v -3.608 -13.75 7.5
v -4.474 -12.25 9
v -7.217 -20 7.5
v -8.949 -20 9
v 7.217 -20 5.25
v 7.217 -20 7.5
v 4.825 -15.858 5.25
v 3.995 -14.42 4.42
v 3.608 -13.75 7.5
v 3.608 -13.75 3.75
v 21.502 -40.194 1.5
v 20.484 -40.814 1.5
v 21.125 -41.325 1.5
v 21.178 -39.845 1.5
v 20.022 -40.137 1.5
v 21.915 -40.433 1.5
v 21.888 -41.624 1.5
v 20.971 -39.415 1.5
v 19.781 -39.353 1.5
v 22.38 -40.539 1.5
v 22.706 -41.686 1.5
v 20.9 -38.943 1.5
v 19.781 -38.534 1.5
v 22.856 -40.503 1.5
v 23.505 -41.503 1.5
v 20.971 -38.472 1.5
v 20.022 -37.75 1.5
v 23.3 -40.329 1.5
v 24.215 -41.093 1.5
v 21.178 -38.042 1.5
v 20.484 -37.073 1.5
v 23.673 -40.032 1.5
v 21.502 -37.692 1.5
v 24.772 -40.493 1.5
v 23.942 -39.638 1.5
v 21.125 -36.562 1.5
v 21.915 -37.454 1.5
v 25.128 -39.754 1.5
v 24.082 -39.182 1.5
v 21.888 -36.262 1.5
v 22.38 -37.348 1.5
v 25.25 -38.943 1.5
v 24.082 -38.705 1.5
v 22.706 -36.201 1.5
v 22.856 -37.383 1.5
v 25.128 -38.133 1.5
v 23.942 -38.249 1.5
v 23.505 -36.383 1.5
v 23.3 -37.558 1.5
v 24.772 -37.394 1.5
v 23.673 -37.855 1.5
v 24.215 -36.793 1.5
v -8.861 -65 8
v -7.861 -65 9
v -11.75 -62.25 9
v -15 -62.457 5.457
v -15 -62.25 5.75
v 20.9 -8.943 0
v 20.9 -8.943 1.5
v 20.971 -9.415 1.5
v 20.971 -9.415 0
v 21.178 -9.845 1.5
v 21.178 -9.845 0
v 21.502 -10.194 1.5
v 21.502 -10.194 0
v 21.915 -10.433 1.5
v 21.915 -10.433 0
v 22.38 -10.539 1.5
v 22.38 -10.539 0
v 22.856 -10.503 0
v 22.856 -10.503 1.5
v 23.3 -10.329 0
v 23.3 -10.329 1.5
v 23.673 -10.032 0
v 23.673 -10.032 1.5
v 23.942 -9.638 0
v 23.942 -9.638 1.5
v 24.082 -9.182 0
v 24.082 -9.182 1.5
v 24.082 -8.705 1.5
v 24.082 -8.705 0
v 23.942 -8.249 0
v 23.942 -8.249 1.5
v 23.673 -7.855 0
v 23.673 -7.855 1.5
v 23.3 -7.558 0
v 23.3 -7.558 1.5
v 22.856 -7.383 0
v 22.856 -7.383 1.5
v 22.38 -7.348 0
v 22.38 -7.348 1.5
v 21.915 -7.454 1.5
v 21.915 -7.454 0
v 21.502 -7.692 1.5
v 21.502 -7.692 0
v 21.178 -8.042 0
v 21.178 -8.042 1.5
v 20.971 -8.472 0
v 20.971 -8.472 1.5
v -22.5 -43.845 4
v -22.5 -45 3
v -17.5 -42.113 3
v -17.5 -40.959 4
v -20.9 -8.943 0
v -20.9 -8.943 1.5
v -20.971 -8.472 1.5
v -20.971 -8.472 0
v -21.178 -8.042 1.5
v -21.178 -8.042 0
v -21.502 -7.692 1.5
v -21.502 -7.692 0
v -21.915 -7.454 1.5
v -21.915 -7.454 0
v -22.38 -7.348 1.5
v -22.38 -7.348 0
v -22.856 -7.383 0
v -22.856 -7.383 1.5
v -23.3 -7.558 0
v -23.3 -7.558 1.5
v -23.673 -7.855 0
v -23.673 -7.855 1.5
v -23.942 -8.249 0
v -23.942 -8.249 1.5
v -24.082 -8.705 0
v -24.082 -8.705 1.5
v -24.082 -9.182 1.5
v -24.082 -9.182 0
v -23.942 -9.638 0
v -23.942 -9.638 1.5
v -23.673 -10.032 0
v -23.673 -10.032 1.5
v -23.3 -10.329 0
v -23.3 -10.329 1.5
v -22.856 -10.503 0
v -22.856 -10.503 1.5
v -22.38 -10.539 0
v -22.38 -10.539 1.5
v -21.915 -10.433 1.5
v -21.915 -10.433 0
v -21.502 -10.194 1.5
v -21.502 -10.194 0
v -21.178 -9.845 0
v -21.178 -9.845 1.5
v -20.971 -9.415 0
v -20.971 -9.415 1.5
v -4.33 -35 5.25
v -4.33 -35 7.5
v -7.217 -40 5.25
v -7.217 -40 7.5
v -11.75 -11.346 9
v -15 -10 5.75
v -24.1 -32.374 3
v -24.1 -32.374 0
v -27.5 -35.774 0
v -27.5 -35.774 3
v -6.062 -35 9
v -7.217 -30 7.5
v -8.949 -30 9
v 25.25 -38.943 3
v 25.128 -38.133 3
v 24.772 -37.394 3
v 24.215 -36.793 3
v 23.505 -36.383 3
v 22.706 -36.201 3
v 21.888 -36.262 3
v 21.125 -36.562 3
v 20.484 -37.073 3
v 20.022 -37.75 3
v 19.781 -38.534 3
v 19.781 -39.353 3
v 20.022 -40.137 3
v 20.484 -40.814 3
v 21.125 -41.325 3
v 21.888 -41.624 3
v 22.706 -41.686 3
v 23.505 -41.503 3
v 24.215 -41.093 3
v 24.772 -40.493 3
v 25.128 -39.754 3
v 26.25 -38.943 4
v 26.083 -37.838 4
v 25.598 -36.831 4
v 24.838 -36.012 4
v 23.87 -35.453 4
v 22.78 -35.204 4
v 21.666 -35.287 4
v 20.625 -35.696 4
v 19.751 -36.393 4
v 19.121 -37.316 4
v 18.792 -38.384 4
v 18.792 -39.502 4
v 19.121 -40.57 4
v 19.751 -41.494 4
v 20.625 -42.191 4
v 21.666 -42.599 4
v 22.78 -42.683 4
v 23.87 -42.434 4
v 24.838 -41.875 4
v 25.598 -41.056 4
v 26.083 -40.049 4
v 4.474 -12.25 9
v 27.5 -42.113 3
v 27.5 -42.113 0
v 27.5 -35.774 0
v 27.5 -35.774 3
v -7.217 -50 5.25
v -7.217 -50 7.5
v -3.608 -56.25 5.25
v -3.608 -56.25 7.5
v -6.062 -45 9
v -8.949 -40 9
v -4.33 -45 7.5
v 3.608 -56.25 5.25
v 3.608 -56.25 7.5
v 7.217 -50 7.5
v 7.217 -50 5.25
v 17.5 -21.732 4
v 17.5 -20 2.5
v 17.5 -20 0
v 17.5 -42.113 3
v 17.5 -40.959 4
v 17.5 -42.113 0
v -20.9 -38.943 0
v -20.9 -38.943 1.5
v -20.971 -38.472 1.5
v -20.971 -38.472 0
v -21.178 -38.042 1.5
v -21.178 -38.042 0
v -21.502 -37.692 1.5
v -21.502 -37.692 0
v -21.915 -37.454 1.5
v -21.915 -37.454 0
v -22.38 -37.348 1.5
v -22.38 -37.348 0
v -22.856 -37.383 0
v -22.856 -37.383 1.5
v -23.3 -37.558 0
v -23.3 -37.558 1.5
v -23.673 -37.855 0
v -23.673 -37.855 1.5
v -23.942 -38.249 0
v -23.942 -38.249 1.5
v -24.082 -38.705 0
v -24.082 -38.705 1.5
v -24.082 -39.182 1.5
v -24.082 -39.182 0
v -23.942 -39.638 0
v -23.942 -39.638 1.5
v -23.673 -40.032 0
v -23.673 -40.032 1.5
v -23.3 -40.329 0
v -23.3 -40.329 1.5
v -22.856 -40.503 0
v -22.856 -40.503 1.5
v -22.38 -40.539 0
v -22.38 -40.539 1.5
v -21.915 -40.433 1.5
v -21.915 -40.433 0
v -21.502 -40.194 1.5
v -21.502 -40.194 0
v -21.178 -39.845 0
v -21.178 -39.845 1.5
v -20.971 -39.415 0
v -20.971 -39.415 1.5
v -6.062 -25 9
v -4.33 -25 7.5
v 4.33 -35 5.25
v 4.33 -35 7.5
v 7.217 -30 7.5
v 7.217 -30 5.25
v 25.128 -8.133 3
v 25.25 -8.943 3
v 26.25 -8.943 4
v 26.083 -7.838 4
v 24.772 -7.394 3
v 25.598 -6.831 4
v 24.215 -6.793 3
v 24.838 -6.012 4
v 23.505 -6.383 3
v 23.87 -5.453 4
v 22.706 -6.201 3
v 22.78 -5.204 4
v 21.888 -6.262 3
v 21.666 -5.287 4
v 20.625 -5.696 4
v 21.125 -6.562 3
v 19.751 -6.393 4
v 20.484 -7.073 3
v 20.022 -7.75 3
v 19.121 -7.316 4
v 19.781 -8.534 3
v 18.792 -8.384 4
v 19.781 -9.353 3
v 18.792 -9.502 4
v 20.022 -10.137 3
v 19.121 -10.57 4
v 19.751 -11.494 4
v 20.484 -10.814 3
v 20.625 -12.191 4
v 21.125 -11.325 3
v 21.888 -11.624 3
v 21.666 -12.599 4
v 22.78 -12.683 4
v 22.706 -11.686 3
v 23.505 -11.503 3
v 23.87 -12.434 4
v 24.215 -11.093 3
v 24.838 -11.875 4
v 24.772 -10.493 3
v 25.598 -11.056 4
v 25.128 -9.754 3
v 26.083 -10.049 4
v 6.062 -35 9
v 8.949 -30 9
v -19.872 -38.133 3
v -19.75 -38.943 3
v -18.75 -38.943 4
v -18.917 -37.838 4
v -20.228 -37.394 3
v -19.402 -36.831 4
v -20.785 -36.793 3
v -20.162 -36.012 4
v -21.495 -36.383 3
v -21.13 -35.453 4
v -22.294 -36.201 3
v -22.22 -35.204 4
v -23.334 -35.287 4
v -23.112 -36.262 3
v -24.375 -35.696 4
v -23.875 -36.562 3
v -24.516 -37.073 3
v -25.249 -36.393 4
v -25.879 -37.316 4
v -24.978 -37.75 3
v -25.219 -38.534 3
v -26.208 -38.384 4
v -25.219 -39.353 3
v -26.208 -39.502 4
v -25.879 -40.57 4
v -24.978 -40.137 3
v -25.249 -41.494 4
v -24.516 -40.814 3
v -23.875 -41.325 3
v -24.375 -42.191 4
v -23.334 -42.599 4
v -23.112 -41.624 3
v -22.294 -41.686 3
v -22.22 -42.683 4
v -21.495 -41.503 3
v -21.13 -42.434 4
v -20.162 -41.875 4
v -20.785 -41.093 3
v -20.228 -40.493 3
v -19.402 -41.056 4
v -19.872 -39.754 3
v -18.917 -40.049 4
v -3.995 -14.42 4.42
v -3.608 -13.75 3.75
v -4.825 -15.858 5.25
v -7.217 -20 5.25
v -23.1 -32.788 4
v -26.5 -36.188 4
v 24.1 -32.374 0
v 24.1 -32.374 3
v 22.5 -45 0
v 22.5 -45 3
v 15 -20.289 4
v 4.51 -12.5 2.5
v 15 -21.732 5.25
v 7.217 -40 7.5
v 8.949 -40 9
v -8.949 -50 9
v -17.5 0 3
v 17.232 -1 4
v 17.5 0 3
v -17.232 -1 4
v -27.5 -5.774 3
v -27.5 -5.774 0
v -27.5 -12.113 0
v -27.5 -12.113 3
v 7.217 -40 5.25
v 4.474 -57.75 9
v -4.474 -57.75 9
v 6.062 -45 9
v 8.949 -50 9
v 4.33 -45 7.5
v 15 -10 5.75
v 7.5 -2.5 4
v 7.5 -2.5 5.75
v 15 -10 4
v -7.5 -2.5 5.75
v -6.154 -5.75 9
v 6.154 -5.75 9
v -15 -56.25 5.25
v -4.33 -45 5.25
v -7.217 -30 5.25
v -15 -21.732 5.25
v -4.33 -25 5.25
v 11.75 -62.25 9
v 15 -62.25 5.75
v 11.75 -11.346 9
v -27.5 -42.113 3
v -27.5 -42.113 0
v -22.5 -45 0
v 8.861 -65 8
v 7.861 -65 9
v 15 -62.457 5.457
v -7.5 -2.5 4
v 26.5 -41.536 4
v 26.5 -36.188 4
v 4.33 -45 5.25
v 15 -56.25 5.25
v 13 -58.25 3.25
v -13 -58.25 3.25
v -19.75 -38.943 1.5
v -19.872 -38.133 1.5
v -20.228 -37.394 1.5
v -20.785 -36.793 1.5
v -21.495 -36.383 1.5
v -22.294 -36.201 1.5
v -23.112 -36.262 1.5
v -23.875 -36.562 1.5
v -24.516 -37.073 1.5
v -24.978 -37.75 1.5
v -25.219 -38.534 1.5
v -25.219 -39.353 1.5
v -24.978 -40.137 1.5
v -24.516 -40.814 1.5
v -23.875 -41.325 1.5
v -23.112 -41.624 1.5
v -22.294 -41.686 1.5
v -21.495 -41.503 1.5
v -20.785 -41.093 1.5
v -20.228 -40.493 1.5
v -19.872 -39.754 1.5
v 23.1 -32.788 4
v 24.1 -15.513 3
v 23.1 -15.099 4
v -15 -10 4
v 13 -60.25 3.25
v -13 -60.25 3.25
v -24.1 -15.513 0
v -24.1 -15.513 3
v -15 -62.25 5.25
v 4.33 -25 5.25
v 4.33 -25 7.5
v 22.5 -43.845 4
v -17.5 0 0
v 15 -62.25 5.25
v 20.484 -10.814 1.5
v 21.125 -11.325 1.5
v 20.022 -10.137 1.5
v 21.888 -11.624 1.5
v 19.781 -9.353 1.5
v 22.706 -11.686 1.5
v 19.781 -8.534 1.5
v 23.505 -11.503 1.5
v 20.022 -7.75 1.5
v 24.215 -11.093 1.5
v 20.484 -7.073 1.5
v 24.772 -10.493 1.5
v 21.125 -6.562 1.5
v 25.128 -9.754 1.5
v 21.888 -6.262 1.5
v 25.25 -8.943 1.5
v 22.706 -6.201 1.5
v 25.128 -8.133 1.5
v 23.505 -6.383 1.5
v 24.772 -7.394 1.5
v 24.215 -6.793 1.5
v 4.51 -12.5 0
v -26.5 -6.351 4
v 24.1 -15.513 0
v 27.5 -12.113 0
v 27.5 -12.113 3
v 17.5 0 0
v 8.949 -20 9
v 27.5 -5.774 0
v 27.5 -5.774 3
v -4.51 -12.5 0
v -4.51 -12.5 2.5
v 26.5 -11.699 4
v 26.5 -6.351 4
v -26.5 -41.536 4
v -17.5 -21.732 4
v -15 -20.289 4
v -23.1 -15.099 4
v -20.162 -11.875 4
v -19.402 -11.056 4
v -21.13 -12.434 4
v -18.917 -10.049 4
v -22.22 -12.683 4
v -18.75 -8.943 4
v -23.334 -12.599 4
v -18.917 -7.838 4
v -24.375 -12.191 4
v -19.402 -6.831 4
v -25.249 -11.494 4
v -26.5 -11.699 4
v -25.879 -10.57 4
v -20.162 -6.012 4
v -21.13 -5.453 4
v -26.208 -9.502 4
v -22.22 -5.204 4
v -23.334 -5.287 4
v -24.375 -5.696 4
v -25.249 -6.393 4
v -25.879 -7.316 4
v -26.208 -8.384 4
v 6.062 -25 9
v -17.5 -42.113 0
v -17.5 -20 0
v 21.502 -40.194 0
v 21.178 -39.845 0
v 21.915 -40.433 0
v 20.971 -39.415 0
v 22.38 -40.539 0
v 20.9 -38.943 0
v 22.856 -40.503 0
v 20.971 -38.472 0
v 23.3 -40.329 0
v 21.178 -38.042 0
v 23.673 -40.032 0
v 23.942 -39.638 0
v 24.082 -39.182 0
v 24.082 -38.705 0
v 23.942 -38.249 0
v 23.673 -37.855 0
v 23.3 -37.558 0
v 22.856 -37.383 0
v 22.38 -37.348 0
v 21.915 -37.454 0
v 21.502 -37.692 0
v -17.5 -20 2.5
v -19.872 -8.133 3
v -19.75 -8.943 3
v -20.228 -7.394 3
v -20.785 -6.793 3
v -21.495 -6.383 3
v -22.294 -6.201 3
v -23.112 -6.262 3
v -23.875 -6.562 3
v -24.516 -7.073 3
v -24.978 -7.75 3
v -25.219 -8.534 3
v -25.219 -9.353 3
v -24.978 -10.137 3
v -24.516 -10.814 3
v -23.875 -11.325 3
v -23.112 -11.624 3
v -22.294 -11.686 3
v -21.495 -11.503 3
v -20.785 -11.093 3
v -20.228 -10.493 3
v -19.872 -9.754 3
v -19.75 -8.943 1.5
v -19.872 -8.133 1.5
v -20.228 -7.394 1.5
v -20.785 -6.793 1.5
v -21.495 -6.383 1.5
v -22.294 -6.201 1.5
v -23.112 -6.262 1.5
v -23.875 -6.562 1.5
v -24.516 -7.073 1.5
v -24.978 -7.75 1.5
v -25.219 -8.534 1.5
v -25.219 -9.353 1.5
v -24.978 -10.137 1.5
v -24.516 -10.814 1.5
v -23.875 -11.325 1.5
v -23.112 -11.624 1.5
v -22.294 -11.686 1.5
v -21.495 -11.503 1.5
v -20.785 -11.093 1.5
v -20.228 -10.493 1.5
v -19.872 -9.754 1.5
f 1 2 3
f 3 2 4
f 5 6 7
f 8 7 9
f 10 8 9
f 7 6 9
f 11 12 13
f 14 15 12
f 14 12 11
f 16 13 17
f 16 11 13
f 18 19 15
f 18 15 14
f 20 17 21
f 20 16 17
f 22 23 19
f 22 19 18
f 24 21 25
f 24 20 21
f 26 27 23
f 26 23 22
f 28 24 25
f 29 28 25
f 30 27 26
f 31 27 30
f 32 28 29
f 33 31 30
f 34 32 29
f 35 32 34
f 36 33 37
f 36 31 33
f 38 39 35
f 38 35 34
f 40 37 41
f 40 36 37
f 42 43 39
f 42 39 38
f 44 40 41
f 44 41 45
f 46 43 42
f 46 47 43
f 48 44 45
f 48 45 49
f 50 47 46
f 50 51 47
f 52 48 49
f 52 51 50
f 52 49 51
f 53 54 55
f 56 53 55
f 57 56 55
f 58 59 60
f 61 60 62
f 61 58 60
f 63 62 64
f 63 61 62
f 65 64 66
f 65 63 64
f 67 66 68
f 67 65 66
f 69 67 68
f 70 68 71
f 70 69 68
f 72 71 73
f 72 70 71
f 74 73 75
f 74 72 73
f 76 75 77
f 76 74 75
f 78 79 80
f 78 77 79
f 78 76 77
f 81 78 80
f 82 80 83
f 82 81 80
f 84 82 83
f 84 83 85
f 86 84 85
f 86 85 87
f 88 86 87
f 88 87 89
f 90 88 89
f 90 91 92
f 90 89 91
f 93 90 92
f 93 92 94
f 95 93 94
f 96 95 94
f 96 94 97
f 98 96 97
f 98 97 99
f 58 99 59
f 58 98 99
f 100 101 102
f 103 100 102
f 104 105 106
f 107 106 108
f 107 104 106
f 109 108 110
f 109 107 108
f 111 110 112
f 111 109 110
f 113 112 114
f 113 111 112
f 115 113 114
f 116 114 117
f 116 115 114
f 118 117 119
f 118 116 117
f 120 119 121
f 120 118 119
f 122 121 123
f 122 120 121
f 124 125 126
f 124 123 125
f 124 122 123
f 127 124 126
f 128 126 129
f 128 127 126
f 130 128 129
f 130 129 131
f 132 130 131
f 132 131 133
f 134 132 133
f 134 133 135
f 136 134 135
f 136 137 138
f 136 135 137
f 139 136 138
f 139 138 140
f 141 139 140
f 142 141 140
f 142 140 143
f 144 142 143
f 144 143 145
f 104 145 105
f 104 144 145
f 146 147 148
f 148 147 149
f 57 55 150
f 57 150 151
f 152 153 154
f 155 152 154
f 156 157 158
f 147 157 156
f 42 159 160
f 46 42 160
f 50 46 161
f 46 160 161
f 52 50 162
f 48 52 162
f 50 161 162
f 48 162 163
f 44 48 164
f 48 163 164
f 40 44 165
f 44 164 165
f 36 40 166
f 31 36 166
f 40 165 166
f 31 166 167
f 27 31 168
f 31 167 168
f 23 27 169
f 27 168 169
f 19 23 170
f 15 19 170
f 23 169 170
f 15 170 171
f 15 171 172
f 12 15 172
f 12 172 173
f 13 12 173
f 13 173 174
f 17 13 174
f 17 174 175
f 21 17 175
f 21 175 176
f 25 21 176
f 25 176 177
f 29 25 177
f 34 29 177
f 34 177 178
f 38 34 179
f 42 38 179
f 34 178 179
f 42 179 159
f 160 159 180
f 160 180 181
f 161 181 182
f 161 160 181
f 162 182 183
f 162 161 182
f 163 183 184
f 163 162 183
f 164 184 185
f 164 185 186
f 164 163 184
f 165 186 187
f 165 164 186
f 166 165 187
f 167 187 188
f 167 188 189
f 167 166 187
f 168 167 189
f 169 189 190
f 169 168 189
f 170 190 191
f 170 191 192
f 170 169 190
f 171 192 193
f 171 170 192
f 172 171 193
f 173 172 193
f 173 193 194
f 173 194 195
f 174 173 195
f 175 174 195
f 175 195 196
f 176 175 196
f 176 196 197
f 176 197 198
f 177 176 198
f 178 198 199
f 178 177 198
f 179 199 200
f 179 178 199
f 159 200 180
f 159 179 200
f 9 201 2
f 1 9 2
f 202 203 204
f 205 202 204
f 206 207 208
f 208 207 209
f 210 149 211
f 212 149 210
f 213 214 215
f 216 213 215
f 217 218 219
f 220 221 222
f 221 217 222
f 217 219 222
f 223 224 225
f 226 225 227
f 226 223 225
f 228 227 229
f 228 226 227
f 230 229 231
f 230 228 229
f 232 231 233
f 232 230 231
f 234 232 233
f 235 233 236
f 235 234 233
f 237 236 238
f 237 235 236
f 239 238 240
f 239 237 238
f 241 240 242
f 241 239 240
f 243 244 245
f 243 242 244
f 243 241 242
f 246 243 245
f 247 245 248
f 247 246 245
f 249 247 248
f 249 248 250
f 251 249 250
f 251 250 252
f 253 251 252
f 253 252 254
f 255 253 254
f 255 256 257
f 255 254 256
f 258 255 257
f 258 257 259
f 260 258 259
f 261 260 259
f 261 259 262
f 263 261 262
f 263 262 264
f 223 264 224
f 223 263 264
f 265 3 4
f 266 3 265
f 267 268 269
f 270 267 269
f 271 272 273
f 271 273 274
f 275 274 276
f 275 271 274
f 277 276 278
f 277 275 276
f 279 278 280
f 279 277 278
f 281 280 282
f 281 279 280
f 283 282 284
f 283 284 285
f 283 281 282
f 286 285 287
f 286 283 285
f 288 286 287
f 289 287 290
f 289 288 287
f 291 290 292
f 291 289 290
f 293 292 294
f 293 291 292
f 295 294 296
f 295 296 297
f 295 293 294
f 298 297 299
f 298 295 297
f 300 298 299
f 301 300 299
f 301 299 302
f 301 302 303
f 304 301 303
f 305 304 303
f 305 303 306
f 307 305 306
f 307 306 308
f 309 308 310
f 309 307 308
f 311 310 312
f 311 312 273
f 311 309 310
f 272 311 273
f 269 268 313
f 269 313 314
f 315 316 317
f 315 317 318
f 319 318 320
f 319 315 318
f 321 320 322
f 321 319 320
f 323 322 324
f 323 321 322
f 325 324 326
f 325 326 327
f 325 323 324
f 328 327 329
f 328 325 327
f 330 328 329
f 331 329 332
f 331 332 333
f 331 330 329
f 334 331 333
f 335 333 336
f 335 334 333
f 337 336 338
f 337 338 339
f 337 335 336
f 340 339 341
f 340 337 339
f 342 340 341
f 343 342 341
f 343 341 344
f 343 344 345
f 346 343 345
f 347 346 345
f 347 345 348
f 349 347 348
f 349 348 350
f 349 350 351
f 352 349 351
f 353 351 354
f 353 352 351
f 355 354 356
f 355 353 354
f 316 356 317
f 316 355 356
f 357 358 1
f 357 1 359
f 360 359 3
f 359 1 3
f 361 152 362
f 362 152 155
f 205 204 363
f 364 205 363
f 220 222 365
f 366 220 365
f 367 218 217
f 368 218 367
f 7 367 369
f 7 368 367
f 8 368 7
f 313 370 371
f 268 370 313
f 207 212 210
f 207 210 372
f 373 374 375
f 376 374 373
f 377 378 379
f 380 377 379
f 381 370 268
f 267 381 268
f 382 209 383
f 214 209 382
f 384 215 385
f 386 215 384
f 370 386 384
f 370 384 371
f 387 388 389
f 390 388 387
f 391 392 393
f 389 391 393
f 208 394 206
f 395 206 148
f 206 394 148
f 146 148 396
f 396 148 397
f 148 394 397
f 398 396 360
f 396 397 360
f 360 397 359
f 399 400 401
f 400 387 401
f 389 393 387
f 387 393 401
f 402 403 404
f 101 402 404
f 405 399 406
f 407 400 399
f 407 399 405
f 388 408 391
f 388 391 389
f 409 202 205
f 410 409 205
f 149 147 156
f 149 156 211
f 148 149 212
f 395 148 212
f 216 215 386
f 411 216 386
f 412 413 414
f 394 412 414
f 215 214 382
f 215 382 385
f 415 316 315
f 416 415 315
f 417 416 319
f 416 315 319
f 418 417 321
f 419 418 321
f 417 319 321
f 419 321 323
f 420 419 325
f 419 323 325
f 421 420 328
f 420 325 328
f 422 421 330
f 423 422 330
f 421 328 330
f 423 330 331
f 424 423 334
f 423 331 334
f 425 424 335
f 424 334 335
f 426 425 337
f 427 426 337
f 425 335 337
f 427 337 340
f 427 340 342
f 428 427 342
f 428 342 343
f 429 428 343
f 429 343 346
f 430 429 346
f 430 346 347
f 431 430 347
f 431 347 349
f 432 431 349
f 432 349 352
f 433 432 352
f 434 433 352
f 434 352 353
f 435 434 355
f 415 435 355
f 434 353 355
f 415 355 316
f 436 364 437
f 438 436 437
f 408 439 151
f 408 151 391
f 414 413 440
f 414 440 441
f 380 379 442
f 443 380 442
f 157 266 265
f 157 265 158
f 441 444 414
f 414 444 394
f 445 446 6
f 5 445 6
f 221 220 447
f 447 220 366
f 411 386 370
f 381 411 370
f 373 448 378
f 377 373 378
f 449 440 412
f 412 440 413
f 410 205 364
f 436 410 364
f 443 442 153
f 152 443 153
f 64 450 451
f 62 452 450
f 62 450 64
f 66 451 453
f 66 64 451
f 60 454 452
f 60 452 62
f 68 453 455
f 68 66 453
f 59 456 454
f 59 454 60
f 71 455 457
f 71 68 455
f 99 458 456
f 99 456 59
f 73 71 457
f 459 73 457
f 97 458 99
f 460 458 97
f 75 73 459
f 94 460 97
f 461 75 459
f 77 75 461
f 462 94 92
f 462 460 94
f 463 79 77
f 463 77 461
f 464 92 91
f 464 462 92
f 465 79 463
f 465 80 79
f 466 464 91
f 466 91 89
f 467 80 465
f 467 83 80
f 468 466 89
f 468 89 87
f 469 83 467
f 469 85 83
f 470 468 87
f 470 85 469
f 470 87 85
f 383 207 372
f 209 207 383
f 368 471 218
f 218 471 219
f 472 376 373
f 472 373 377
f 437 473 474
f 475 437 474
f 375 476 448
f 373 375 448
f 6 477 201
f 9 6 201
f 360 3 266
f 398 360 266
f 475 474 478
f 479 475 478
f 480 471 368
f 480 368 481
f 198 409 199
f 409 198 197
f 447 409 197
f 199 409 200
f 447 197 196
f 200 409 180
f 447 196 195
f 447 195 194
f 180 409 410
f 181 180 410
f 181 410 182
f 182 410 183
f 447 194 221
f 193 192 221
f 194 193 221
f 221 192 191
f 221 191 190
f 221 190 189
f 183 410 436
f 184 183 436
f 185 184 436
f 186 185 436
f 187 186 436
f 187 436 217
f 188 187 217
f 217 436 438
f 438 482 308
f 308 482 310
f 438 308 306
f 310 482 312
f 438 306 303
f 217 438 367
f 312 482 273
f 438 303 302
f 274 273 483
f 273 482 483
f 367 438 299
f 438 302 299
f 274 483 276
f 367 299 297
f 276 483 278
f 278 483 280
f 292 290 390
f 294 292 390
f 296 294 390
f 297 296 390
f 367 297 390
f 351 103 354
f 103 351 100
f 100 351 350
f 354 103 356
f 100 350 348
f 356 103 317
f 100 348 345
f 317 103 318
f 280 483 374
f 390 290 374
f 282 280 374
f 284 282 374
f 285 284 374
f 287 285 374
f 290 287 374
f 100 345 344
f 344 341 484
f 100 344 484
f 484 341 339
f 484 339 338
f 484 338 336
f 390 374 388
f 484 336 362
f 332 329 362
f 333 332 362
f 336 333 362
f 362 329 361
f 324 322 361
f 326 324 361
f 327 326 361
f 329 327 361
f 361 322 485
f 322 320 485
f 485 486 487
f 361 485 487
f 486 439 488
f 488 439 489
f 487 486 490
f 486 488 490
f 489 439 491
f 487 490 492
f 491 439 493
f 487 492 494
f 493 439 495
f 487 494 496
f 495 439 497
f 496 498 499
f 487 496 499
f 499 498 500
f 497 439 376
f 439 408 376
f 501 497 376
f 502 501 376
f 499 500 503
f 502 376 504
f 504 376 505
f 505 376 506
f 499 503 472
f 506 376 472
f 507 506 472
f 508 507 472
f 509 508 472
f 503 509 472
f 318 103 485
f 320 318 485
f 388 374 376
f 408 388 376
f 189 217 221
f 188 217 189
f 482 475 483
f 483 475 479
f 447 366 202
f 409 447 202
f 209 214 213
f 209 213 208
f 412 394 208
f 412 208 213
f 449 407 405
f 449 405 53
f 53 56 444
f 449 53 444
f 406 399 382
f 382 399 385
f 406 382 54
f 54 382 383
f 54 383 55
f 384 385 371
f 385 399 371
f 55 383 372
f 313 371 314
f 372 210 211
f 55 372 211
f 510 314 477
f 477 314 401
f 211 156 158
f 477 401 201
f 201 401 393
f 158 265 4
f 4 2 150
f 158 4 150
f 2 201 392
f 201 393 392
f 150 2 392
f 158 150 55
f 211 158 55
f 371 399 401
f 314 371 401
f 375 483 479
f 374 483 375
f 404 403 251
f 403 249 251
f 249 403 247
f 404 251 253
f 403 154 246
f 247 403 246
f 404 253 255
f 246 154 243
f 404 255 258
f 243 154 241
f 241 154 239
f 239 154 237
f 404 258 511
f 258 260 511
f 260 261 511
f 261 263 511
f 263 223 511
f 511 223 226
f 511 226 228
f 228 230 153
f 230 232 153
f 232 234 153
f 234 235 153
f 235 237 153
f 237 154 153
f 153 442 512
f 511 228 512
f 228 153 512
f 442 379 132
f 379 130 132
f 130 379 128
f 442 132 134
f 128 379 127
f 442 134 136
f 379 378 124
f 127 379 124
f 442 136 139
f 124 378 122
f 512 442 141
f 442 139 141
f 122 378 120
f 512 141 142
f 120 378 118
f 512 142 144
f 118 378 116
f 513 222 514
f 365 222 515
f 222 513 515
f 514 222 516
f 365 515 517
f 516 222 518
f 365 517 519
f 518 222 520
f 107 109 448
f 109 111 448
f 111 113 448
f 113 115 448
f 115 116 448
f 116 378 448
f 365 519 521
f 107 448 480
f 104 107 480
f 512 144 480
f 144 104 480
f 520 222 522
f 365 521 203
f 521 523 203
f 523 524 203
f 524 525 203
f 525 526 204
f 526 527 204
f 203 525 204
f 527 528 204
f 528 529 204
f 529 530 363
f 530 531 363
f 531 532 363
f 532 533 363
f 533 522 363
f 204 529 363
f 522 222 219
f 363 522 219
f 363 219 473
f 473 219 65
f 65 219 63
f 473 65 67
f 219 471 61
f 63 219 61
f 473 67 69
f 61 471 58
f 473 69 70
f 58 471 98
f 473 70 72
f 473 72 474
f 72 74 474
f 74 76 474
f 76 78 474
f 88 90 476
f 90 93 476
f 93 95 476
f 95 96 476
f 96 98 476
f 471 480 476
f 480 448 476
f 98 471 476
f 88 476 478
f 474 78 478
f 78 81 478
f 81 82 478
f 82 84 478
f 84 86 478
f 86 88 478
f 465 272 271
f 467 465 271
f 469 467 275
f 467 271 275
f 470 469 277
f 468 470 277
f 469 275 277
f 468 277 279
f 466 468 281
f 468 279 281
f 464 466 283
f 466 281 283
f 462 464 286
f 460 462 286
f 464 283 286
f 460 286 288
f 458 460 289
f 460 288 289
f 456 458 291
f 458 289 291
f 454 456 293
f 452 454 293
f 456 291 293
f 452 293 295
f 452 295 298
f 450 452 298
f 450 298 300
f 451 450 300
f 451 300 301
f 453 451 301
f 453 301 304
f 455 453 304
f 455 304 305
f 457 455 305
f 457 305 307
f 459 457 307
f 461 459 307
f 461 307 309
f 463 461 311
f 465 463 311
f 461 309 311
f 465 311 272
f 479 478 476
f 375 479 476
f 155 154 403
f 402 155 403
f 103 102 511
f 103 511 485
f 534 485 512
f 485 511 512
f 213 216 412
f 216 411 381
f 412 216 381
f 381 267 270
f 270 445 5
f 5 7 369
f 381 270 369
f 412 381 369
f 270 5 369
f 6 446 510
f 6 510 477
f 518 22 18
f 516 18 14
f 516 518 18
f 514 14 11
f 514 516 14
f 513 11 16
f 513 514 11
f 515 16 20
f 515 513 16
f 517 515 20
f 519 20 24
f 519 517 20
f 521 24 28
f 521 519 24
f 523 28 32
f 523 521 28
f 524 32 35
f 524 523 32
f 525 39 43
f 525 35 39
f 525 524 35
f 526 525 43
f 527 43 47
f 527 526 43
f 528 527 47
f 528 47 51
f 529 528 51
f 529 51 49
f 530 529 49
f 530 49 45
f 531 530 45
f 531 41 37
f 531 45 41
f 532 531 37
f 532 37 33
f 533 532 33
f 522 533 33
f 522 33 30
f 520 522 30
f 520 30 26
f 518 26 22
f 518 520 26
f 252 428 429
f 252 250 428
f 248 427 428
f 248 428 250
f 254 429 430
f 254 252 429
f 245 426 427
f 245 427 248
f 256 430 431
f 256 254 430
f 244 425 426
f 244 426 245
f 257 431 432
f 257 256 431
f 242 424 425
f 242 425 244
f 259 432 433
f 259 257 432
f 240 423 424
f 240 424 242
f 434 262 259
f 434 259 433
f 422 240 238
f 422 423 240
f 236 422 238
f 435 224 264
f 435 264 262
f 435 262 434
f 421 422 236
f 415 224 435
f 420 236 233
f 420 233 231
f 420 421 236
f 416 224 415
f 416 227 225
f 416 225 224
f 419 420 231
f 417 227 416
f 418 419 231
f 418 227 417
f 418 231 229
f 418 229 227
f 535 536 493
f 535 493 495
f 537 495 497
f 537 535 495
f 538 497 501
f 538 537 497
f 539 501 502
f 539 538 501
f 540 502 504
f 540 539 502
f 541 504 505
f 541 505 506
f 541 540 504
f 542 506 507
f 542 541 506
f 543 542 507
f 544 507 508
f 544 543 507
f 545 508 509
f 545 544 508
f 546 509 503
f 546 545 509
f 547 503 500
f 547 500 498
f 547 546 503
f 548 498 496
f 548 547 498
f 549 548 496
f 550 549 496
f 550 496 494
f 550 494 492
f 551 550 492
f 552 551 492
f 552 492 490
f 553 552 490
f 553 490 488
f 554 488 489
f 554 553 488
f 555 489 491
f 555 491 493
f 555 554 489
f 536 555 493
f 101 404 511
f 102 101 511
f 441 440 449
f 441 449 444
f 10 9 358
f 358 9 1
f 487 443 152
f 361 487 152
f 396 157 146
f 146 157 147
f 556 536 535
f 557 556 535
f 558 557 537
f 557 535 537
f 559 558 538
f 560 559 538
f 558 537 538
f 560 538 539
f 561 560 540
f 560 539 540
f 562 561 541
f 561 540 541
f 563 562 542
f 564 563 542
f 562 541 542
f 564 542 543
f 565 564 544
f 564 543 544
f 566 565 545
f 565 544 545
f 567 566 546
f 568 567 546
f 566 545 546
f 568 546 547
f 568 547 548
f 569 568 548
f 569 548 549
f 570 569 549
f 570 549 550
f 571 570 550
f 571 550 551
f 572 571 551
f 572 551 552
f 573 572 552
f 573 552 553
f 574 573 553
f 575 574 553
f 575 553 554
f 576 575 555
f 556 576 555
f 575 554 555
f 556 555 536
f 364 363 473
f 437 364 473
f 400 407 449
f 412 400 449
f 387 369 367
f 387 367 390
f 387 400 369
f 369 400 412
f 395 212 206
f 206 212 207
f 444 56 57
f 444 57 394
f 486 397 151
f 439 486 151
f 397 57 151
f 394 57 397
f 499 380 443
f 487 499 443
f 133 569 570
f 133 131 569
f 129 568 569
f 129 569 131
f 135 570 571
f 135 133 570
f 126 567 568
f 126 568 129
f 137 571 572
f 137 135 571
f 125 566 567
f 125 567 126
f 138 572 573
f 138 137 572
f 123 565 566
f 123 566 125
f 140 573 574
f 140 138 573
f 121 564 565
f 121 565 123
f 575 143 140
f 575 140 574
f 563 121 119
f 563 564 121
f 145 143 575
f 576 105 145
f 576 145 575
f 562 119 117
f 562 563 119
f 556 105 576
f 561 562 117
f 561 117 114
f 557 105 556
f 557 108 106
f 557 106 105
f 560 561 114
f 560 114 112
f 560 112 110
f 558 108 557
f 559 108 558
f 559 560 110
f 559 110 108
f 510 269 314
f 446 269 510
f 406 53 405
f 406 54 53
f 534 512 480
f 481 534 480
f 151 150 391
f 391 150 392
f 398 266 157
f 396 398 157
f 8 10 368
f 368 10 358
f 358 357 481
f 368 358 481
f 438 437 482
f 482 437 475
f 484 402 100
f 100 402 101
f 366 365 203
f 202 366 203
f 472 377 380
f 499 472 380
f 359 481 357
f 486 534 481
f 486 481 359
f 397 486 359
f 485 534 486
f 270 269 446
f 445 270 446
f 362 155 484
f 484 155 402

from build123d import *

# Parameters (mm, degrees)
SKETCH1_R           = 1.6
BOSS_EXTRUDE1_DEPTH = 4
SKETCH2_R           = 2.75
CUT_EXTRUDE1_DEPTH  = 2.5
CHAMFER1_SIZE       = 1
BOSS_EXTRUDE2_DEPTH = 5
CHAMFER2_SIZE       = 3.25
BOSS_EXTRUDE3_DEPTH = 52.5
CHAMFER3_SIZE       = 2.75
CUT_EXTRUDE3_DEPTH  = 50
CHAMFER4_SIZE       = 1.5
SKETCH6_W           = 30
SKETCH6_H           = 6
BOSS_EXTRUDE4_DEPTH = 2
CHAMFER5_SIZE       = 2


# Some blends are built 0.0001 mm under size
with BuildPart() as part:
    # Sketch1 → Boss-Extrude1 (new body)
    with BuildSketch(Plane.XY):
        Polygon((17.5, 0), (-17.5, 0), (-27.5, -5.773502692), (-27.5, -12.113248654), (-24.1, -15.513248654), (-24.1, -32.373502692), (-27.5, -35.773502692), (-27.5, -42.113248654), (-22.5, -45), (-17.5, -42.113248654), (-17.5, -20), (-4.509618943, -12.5), (4.509618943, -12.5), (17.5, -20), (17.5, -42.113248654), (22.5, -45), (27.5, -42.113248654), (27.5, -35.773502692), (24.1, -32.373502692), (24.1, -15.513248654), (27.5, -12.113248654), (27.5, -5.773502692), align=None)
        with Locations((-22.5, -8.943375673)):
            Circle(SKETCH1_R, mode=Mode.SUBTRACT)
        with Locations((-22.5, -38.943375673)):
            Circle(SKETCH1_R, mode=Mode.SUBTRACT)
        with Locations(Location((22.5, -38.943375673, 0), (0, 0, 180))):
            Circle(SKETCH1_R, mode=Mode.SUBTRACT)
        with Locations(Location((22.5, -8.943375673, 0), (0, 0, 180))):
            Circle(SKETCH1_R, mode=Mode.SUBTRACT)
    extrude(amount=BOSS_EXTRUDE1_DEPTH)

    # Sketch2 → Cut-Extrude1 (cut)
    with BuildSketch(Plane.XY.offset(4)):
        with Locations((-22.5, -8.943375673)):
            Circle(SKETCH2_R)
        with Locations((22.5, -8.943375673)):
            Circle(SKETCH2_R)
        with Locations((22.5, -38.943375673)):
            Circle(SKETCH2_R)
        with Locations((-22.5, -38.943375673)):
            Circle(SKETCH2_R)
    extrude(amount=-CUT_EXTRUDE1_DEPTH, mode=Mode.SUBTRACT)

    # Chamfer1
    chamfer1_edges = [part.edges().sort_by_distance(p)[0] for p in [
        (-25.8, -13.813248654, 4),
        (-24.1, -23.943375673, 4),
        (-25.8, -34.073502692, 4),
        (-27.5, -38.943375673, 4),
        (-25, -43.556624327, 4),
        (-20, -43.556624327, 4),
        (-22.5, -2.886751346, 4),
        (20, -43.556624327, 4),
        (25, -43.556624327, 4),
        (27.5, -38.943375673, 4),
        (25.8, -34.073502692, 4),
        (24.1, -23.943375673, 4),
        (25.8, -13.813248654, 4),
        (27.5, -8.943375673, 4),
        (22.5, -2.886751346, 4),
        (-25.25, -38.943375673, 4),
        (0, 0, 4),
        (-27.5, -8.943375673, 4),
        (19.75, -38.943375673, 4),
        (19.75, -8.943375673, 4),
        (-25.25, -8.943375673, 4),
    ]]
    chamfer(chamfer1_edges, length=CHAMFER1_SIZE)

    # Sketch3 → Boss-Extrude2 (add)
    with BuildSketch(Plane.XY.offset(4)):
        Polygon((-7.5, -2.5), (7.5, -2.5), (15, -10), (15, -18.556624327), (4.509618943, -12.5), (-4.509618943, -12.5), (-15, -18.556624327), (-15, -10), align=None)
    extrude(amount=BOSS_EXTRUDE2_DEPTH)

    # Chamfer2
    chamfer2_edges = [part.edges().sort_by_distance(p)[0] for p in [
        (-11.25, -6.25, 9),
        (-15, -14.278312164, 9),
        (15, -14.278312164, 9),
        (11.25, -6.25, 9),
        (0, -2.5, 9),
    ]]
    chamfer(chamfer2_edges, length=CHAMFER2_SIZE)

    # Sketch4 → Boss-Extrude3 (add)
    with BuildSketch(Plane.XZ.offset(12.5)):
        Polygon((-11.75, 9), (-15, 5.75), (-15, 5.25), (15, 5.25), (15, 5.75), (11.75, 9), (4.509618943, 9), (-4.509618943, 9), align=None)
    extrude(amount=BOSS_EXTRUDE3_DEPTH)

    # Chamfer3
    # the kernel refuses this chamfer: 2.75 mm, written as the material it adds along each edge
    with BuildSketch(Plane(origin=(-21.124642695, -22.092688435, 5.25), x_dir=(-0.01374793830529312, 0.02381212764408999, -0.9996219169112968), z_dir=(0.8660254037844382, 0.500000000000001, 0))) as chamfer3_piece_1_section:
        Polygon((CHAMFER3_SIZE * 0.999621916911, -CHAMFER3_SIZE * 0.0274958766106), (-CHAMFER3_SIZE * 0.0274958766106, -CHAMFER3_SIZE * 0.999621916911), (0, 0), align=None)
    chamfer3_piece_1 = extrude(amount=26.257505088, mode=Mode.PRIVATE)
    chamfer3_piece_1 = split(chamfer3_piece_1, bisect_by=Plane(origin=(-17.954336586, -20.761071598, 4), z_dir=(0, 0, -1)), keep=Keep.TOP, mode=Mode.PRIVATE)
    chamfer3_piece_1 = split(chamfer3_piece_1, bisect_by=Plane(origin=(-15, -20.761071598, 3.452040033), z_dir=(-1, 0, 0)), keep=Keep.TOP, mode=Mode.PRIVATE)
    add(chamfer3_piece_1)
    with BuildSketch(Plane(origin=(-21.124642695, -22.092688435, 5.25), x_dir=(-0.01374793830529312, 0.02381212764408999, -0.9996219169112968), z_dir=(0.8660254037844382, 0.500000000000001, 0))) as chamfer3_piece_2_section:
        Polygon((CHAMFER3_SIZE * 0.999621916911, -CHAMFER3_SIZE * 0.0274958766106), (-CHAMFER3_SIZE * 0.0274958766106, -CHAMFER3_SIZE * 0.999621916911), (0, 0), align=None)
    chamfer3_piece_2 = extrude(amount=26.257505088, mode=Mode.PRIVATE)
    chamfer3_piece_2 = split(chamfer3_piece_2, bisect_by=Plane(origin=(-9.286470949, -15.798707536, 4), z_dir=(0, 0, -1)), keep=Keep.TOP, mode=Mode.PRIVATE)
    chamfer3_piece_2 = split(chamfer3_piece_2, bisect_by=Plane(origin=(-9.286470949, -12.5, 3.472082551), z_dir=(0, -1, 0)), keep=Keep.TOP, mode=Mode.PRIVATE)
    chamfer3_piece_2 = split(chamfer3_piece_2, bisect_by=Plane(origin=(-15, -15.798707536, 3.472082551), z_dir=(1, 0, 0)), keep=Keep.TOP, mode=Mode.PRIVATE)
    add(chamfer3_piece_2)
    with BuildSketch(Plane(origin=(-21.124642695, -22.092688435, 5.25), x_dir=(-0.01374793830529312, 0.02381212764408999, -0.9996219169112968), z_dir=(0.8660254037844382, 0.500000000000001, 0))) as chamfer3_piece_3_section:
        Polygon((CHAMFER3_SIZE * 0.999621916911, -CHAMFER3_SIZE * 0.0274958766106), (-CHAMFER3_SIZE * 0.0274958766106, -CHAMFER3_SIZE * 0.999621916911), (0, 0), align=None)
    chamfer3_piece_3 = extrude(amount=26.257505088, mode=Mode.PRIVATE)
    chamfer3_piece_3 = split(chamfer3_piece_3, bisect_by=Plane(origin=(-8.570164938, -16.212267004, 4), z_dir=(0, 0, 1)), keep=Keep.TOP, mode=Mode.PRIVATE)
    chamfer3_piece_3 = split(chamfer3_piece_3, bisect_by=Plane(origin=(-8.570164938, -12.5, 4.737501352), z_dir=(0, -1, 0)), keep=Keep.TOP, mode=Mode.PRIVATE)
    chamfer3_piece_3 = split(chamfer3_piece_3, bisect_by=Plane(origin=(-15, -16.212267004, 4.737501352), z_dir=(1, 0, 0)), keep=Keep.TOP, mode=Mode.PRIVATE)
    add(chamfer3_piece_3)
    with BuildSketch(Plane(origin=(-21.124642695, -22.092688435, 5.25), x_dir=(-0.01374793830529312, 0.02381212764408999, -0.9996219169112968), z_dir=(0.8660254037844382, 0.500000000000001, 0))) as chamfer3_piece_4_section:
        Polygon((CHAMFER3_SIZE * 0.999621916911, -CHAMFER3_SIZE * 0.0274958766106), (-CHAMFER3_SIZE * 0.0274958766106, -CHAMFER3_SIZE * 0.999621916911), (0, 0), align=None)
    chamfer3_piece_4 = extrude(amount=26.257505088, mode=Mode.PRIVATE)
    chamfer3_piece_4 = split(chamfer3_piece_4, bisect_by=Plane(origin=(-0.9405737, -10.907502252, 4), z_dir=(0, 0, -1)), keep=Keep.TOP, mode=Mode.PRIVATE)
    chamfer3_piece_4 = split(chamfer3_piece_4, bisect_by=Plane(origin=(-0.9405737, -12.5, 3.437415432), z_dir=(0, 1, 0)), keep=Keep.TOP, mode=Mode.PRIVATE)
    add(chamfer3_piece_4)
    with BuildSketch(Plane(origin=(-21.124642695, -22.092688435, 5.25), x_dir=(-0.01374793830529312, 0.02381212764408999, -0.9996219169112968), z_dir=(0.8660254037844382, 0.500000000000001, 0))) as chamfer3_piece_5_section:
        Polygon((CHAMFER3_SIZE * 0.999621916911, -CHAMFER3_SIZE * 0.0274958766106), (-CHAMFER3_SIZE * 0.0274958766106, -CHAMFER3_SIZE * 0.999621916911), (0, 0), align=None)
    chamfer3_piece_5 = extrude(amount=26.257505088, mode=Mode.PRIVATE)
    chamfer3_piece_5 = split(chamfer3_piece_5, bisect_by=Plane(origin=(-0.271585023, -11.139246728, 4), z_dir=(0, 0, 1)), keep=Keep.TOP, mode=Mode.PRIVATE)
    chamfer3_piece_5 = split(chamfer3_piece_5, bisect_by=Plane(origin=(-0.271585023, -12.5, 4.697391436), z_dir=(0, 1, 0)), keep=Keep.TOP, mode=Mode.PRIVATE)
    add(chamfer3_piece_5)
    with BuildSketch(Plane(origin=(-1.615023751, -8.963935892, 5.25), x_dir=(0.013747938305293148, 0.023812127644090013, -0.9996219169112968), z_dir=(0.8660254037844379, -0.5000000000000013, 0))) as chamfer3_piece_6_section:
        Polygon((CHAMFER3_SIZE * 0.999621916911, -CHAMFER3_SIZE * 0.0274958766106), (-CHAMFER3_SIZE * 0.0274958766106, -CHAMFER3_SIZE * 0.999621916911), (0, 0), align=None)
    chamfer3_piece_6 = extrude(amount=26.257505088, mode=Mode.PRIVATE)
    chamfer3_piece_6 = split(chamfer3_piece_6, bisect_by=Plane(origin=(0.9405737, -12.5, 3.437415432), z_dir=(0, 1, 0)), keep=Keep.TOP, mode=Mode.PRIVATE)
    chamfer3_piece_6 = split(chamfer3_piece_6, bisect_by=Plane(origin=(0.9405737, -10.907502252, 4), z_dir=(0, 0, -1)), keep=Keep.TOP, mode=Mode.PRIVATE)
    add(chamfer3_piece_6)
    with BuildSketch(Plane(origin=(-1.615023751, -8.963935892, 5.25), x_dir=(0.013747938305293148, 0.023812127644090013, -0.9996219169112968), z_dir=(0.8660254037844379, -0.5000000000000013, 0))) as chamfer3_piece_7_section:
        Polygon((CHAMFER3_SIZE * 0.999621916911, -CHAMFER3_SIZE * 0.0274958766106), (-CHAMFER3_SIZE * 0.0274958766106, -CHAMFER3_SIZE * 0.999621916911), (0, 0), align=None)
    chamfer3_piece_7 = extrude(amount=26.257505088, mode=Mode.PRIVATE)
    chamfer3_piece_7 = split(chamfer3_piece_7, bisect_by=Plane(origin=(0.271585023, -12.5, 4.697391436), z_dir=(0, 1, 0)), keep=Keep.TOP, mode=Mode.PRIVATE)
    chamfer3_piece_7 = split(chamfer3_piece_7, bisect_by=Plane(origin=(0.271585023, -11.139246728, 4), z_dir=(0, 0, 1)), keep=Keep.TOP, mode=Mode.PRIVATE)
    add(chamfer3_piece_7)
    with BuildSketch(Plane(origin=(-1.615023751, -8.963935892, 5.25), x_dir=(0.013747938305293148, 0.023812127644090013, -0.9996219169112968), z_dir=(0.8660254037844379, -0.5000000000000013, 0))) as chamfer3_piece_8_section:
        Polygon((CHAMFER3_SIZE * 0.999621916911, -CHAMFER3_SIZE * 0.0274958766106), (-CHAMFER3_SIZE * 0.0274958766106, -CHAMFER3_SIZE * 0.999621916911), (0, 0), align=None)
    chamfer3_piece_8 = extrude(amount=26.257505088, mode=Mode.PRIVATE)
    chamfer3_piece_8 = split(chamfer3_piece_8, bisect_by=Plane(origin=(15, -15.798707536, 3.472082551), z_dir=(-1, 0, 0)), keep=Keep.TOP, mode=Mode.PRIVATE)
    chamfer3_piece_8 = split(chamfer3_piece_8, bisect_by=Plane(origin=(9.286470949, -12.5, 3.472082551), z_dir=(0, -1, 0)), keep=Keep.TOP, mode=Mode.PRIVATE)
    chamfer3_piece_8 = split(chamfer3_piece_8, bisect_by=Plane(origin=(9.286470949, -15.798707536, 4), z_dir=(0, 0, -1)), keep=Keep.TOP, mode=Mode.PRIVATE)
    add(chamfer3_piece_8)
    with BuildSketch(Plane(origin=(-1.615023751, -8.963935892, 5.25), x_dir=(0.013747938305293148, 0.023812127644090013, -0.9996219169112968), z_dir=(0.8660254037844379, -0.5000000000000013, 0))) as chamfer3_piece_9_section:
        Polygon((CHAMFER3_SIZE * 0.999621916911, -CHAMFER3_SIZE * 0.0274958766106), (-CHAMFER3_SIZE * 0.0274958766106, -CHAMFER3_SIZE * 0.999621916911), (0, 0), align=None)
    chamfer3_piece_9 = extrude(amount=26.257505088, mode=Mode.PRIVATE)
    chamfer3_piece_9 = split(chamfer3_piece_9, bisect_by=Plane(origin=(15, -16.212267004, 4.737501352), z_dir=(-1, 0, 0)), keep=Keep.TOP, mode=Mode.PRIVATE)
    chamfer3_piece_9 = split(chamfer3_piece_9, bisect_by=Plane(origin=(8.570164938, -12.5, 4.737501352), z_dir=(0, -1, 0)), keep=Keep.TOP, mode=Mode.PRIVATE)
    chamfer3_piece_9 = split(chamfer3_piece_9, bisect_by=Plane(origin=(8.570164938, -16.212267004, 4), z_dir=(0, 0, 1)), keep=Keep.TOP, mode=Mode.PRIVATE)
    add(chamfer3_piece_9)
    with BuildSketch(Plane(origin=(-1.615023751, -8.963935892, 5.25), x_dir=(0.013747938305293148, 0.023812127644090013, -0.9996219169112968), z_dir=(0.8660254037844379, -0.5000000000000013, 0))) as chamfer3_piece_10_section:
        Polygon((CHAMFER3_SIZE * 0.999621916911, -CHAMFER3_SIZE * 0.0274958766106), (-CHAMFER3_SIZE * 0.0274958766106, -CHAMFER3_SIZE * 0.999621916911), (0, 0), align=None)
    chamfer3_piece_10 = extrude(amount=26.257505088, mode=Mode.PRIVATE)
    chamfer3_piece_10 = split(chamfer3_piece_10, bisect_by=Plane(origin=(15, -20.761071598, 3.452040033), z_dir=(1, 0, 0)), keep=Keep.TOP, mode=Mode.PRIVATE)
    chamfer3_piece_10 = split(chamfer3_piece_10, bisect_by=Plane(origin=(17.954336586, -20.761071598, 4), z_dir=(0, 0, -1)), keep=Keep.TOP, mode=Mode.PRIVATE)
    add(chamfer3_piece_10)
    with BuildSketch(Plane(origin=(-11.58174716, -12.5, 5.25), x_dir=(0, -0.9996219169112968, 0.02749587661058625), z_dir=(1, 0, 0))) as chamfer3_piece_11:
        Polygon((CHAMFER3_SIZE * 0.999621916911, CHAMFER3_SIZE * 0.0274958766106), (-CHAMFER3_SIZE * 0.0274958766106, CHAMFER3_SIZE * 0.999621916911), (0, 0), align=None)
    extrude(amount=23.16349432)
    # the kernel refuses this chamfer: 2.75 mm, written as the material it takes off along each edge
    with BuildSketch(Plane(origin=(20.00074982, -65, 0.74925018), x_dir=(0.019442520806014035, 0.9996219169112968, 0.019442520806013917), z_dir=(-0.7071067811865454, 0, 0.7071067811865497))) as chamfer3_2_piece_1:
        Polygon((CHAMFER3_SIZE * 0.999621916911, CHAMFER3_SIZE * 0.0274958766106), (-CHAMFER3_SIZE * 0.0274958766106, CHAMFER3_SIZE * 0.999621916911), (0, 0), align=None)
    extrude(amount=18.740450512, mode=Mode.SUBTRACT)
    with BuildSketch(Plane(origin=(-22.072128217, -65, 5.25), x_dir=(0, -0.027495876610587187, 0.9996219169112966), z_dir=(1, 0, 0))) as chamfer3_2_piece_2:
        Polygon((CHAMFER3_SIZE * 0.999621916911, -CHAMFER3_SIZE * 0.0274958766106), (-CHAMFER3_SIZE * 0.0274958766106, -CHAMFER3_SIZE * 0.999621916911), (0, 0), align=None)
    extrude(amount=44.144256434, mode=Mode.SUBTRACT)
    with BuildSketch(Plane(origin=(-6.74925018, -65, 14.00074982), x_dir=(0.7068394360706757, -0.027495876610587198, -0.7068394360706712), z_dir=(-0.7071067811865454, 0, -0.7071067811865497))) as chamfer3_2_piece_3:
        Polygon((CHAMFER3_SIZE * 0.999621916911, -CHAMFER3_SIZE * 0.0274958766106), (-CHAMFER3_SIZE * 0.0274958766106, -CHAMFER3_SIZE * 0.999621916911), (0, 0), align=None)
    extrude(amount=18.740450512, mode=Mode.SUBTRACT)

    # Sketch5 → Cut-Extrude3 (cut)
    with BuildSketch(Plane.XY.offset(9)):
        Polygon((7.216878365, -30), (3.608439182, -23.75), (-3.608439182, -23.75), (-7.216878365, -30), (-3.608439182, -36.25), (3.608439182, -36.25), align=None)
        Polygon((7.216878365, -20), (3.608439182, -13.75), (-3.608439182, -13.75), (-7.216878365, -20), (-3.608439182, -26.25), (3.608439182, -26.25), align=None)
        Polygon((7.216878365, -40), (3.608439182, -33.75), (-3.608439182, -33.75), (-7.216878365, -40), (-3.608439182, -46.25), (3.608439182, -46.25), align=None)
        Polygon((7.216878365, -50), (3.608439182, -43.75), (-3.608439182, -43.75), (-7.216878365, -50), (-3.608439182, -56.25), (3.608439182, -56.25), align=None)
    extrude(amount=-CUT_EXTRUDE3_DEPTH, mode=Mode.SUBTRACT)

    # Chamfer4
    chamfer4_edges = [part.edges().sort_by_distance(p)[0] for p in [
        (5.773502692, -47.5, 9),
        (5.773502692, -42.5, 9),
        (5.773502692, -37.5, 9),
        (5.773502692, -32.5, 9),
        (5.773502692, -27.5, 9),
        (5.773502692, -22.5, 9),
        (5.412658774, -16.875, 9),
        (0, -13.75, 9),
        (-5.412658774, -16.875, 9),
        (-5.773502692, -22.5, 9),
        (-5.773502692, -27.5, 9),
        (-5.773502692, -32.5, 9),
        (-5.773502692, -37.5, 9),
        (-5.773502692, -42.5, 9),
        (-5.773502692, -47.5, 9),
        (-5.412658774, -53.125, 9),
        (0, -56.25, 9),
        (5.412658774, -53.125, 9),
    ]]
    chamfer(chamfer4_edges, length=CHAMFER4_SIZE)

    # Sketch6 → Boss-Extrude4 (add)
    with BuildSketch(Plane(origin=(0, 0, 5.25), x_dir=(-1, 0, 0), z_dir=(0, 0, -1))):
        with Locations((0, -59.25)):
            Rectangle(SKETCH6_W, SKETCH6_H)
    extrude(amount=BOSS_EXTRUDE4_DEPTH)

    # Chamfer5
    chamfer5_edges = [part.edges().sort_by_distance(p)[0] for p in [
        (0, -56.25, 3.25),
        (-15, -59.25, 3.25),
        (0, -62.25, 3.25),
        (15, -59.25, 3.25),
    ]]
    chamfer(chamfer5_edges, length=CHAMFER5_SIZE - 0.0001)  # a hair under: the kernel refuses the full size


solid = part.part
